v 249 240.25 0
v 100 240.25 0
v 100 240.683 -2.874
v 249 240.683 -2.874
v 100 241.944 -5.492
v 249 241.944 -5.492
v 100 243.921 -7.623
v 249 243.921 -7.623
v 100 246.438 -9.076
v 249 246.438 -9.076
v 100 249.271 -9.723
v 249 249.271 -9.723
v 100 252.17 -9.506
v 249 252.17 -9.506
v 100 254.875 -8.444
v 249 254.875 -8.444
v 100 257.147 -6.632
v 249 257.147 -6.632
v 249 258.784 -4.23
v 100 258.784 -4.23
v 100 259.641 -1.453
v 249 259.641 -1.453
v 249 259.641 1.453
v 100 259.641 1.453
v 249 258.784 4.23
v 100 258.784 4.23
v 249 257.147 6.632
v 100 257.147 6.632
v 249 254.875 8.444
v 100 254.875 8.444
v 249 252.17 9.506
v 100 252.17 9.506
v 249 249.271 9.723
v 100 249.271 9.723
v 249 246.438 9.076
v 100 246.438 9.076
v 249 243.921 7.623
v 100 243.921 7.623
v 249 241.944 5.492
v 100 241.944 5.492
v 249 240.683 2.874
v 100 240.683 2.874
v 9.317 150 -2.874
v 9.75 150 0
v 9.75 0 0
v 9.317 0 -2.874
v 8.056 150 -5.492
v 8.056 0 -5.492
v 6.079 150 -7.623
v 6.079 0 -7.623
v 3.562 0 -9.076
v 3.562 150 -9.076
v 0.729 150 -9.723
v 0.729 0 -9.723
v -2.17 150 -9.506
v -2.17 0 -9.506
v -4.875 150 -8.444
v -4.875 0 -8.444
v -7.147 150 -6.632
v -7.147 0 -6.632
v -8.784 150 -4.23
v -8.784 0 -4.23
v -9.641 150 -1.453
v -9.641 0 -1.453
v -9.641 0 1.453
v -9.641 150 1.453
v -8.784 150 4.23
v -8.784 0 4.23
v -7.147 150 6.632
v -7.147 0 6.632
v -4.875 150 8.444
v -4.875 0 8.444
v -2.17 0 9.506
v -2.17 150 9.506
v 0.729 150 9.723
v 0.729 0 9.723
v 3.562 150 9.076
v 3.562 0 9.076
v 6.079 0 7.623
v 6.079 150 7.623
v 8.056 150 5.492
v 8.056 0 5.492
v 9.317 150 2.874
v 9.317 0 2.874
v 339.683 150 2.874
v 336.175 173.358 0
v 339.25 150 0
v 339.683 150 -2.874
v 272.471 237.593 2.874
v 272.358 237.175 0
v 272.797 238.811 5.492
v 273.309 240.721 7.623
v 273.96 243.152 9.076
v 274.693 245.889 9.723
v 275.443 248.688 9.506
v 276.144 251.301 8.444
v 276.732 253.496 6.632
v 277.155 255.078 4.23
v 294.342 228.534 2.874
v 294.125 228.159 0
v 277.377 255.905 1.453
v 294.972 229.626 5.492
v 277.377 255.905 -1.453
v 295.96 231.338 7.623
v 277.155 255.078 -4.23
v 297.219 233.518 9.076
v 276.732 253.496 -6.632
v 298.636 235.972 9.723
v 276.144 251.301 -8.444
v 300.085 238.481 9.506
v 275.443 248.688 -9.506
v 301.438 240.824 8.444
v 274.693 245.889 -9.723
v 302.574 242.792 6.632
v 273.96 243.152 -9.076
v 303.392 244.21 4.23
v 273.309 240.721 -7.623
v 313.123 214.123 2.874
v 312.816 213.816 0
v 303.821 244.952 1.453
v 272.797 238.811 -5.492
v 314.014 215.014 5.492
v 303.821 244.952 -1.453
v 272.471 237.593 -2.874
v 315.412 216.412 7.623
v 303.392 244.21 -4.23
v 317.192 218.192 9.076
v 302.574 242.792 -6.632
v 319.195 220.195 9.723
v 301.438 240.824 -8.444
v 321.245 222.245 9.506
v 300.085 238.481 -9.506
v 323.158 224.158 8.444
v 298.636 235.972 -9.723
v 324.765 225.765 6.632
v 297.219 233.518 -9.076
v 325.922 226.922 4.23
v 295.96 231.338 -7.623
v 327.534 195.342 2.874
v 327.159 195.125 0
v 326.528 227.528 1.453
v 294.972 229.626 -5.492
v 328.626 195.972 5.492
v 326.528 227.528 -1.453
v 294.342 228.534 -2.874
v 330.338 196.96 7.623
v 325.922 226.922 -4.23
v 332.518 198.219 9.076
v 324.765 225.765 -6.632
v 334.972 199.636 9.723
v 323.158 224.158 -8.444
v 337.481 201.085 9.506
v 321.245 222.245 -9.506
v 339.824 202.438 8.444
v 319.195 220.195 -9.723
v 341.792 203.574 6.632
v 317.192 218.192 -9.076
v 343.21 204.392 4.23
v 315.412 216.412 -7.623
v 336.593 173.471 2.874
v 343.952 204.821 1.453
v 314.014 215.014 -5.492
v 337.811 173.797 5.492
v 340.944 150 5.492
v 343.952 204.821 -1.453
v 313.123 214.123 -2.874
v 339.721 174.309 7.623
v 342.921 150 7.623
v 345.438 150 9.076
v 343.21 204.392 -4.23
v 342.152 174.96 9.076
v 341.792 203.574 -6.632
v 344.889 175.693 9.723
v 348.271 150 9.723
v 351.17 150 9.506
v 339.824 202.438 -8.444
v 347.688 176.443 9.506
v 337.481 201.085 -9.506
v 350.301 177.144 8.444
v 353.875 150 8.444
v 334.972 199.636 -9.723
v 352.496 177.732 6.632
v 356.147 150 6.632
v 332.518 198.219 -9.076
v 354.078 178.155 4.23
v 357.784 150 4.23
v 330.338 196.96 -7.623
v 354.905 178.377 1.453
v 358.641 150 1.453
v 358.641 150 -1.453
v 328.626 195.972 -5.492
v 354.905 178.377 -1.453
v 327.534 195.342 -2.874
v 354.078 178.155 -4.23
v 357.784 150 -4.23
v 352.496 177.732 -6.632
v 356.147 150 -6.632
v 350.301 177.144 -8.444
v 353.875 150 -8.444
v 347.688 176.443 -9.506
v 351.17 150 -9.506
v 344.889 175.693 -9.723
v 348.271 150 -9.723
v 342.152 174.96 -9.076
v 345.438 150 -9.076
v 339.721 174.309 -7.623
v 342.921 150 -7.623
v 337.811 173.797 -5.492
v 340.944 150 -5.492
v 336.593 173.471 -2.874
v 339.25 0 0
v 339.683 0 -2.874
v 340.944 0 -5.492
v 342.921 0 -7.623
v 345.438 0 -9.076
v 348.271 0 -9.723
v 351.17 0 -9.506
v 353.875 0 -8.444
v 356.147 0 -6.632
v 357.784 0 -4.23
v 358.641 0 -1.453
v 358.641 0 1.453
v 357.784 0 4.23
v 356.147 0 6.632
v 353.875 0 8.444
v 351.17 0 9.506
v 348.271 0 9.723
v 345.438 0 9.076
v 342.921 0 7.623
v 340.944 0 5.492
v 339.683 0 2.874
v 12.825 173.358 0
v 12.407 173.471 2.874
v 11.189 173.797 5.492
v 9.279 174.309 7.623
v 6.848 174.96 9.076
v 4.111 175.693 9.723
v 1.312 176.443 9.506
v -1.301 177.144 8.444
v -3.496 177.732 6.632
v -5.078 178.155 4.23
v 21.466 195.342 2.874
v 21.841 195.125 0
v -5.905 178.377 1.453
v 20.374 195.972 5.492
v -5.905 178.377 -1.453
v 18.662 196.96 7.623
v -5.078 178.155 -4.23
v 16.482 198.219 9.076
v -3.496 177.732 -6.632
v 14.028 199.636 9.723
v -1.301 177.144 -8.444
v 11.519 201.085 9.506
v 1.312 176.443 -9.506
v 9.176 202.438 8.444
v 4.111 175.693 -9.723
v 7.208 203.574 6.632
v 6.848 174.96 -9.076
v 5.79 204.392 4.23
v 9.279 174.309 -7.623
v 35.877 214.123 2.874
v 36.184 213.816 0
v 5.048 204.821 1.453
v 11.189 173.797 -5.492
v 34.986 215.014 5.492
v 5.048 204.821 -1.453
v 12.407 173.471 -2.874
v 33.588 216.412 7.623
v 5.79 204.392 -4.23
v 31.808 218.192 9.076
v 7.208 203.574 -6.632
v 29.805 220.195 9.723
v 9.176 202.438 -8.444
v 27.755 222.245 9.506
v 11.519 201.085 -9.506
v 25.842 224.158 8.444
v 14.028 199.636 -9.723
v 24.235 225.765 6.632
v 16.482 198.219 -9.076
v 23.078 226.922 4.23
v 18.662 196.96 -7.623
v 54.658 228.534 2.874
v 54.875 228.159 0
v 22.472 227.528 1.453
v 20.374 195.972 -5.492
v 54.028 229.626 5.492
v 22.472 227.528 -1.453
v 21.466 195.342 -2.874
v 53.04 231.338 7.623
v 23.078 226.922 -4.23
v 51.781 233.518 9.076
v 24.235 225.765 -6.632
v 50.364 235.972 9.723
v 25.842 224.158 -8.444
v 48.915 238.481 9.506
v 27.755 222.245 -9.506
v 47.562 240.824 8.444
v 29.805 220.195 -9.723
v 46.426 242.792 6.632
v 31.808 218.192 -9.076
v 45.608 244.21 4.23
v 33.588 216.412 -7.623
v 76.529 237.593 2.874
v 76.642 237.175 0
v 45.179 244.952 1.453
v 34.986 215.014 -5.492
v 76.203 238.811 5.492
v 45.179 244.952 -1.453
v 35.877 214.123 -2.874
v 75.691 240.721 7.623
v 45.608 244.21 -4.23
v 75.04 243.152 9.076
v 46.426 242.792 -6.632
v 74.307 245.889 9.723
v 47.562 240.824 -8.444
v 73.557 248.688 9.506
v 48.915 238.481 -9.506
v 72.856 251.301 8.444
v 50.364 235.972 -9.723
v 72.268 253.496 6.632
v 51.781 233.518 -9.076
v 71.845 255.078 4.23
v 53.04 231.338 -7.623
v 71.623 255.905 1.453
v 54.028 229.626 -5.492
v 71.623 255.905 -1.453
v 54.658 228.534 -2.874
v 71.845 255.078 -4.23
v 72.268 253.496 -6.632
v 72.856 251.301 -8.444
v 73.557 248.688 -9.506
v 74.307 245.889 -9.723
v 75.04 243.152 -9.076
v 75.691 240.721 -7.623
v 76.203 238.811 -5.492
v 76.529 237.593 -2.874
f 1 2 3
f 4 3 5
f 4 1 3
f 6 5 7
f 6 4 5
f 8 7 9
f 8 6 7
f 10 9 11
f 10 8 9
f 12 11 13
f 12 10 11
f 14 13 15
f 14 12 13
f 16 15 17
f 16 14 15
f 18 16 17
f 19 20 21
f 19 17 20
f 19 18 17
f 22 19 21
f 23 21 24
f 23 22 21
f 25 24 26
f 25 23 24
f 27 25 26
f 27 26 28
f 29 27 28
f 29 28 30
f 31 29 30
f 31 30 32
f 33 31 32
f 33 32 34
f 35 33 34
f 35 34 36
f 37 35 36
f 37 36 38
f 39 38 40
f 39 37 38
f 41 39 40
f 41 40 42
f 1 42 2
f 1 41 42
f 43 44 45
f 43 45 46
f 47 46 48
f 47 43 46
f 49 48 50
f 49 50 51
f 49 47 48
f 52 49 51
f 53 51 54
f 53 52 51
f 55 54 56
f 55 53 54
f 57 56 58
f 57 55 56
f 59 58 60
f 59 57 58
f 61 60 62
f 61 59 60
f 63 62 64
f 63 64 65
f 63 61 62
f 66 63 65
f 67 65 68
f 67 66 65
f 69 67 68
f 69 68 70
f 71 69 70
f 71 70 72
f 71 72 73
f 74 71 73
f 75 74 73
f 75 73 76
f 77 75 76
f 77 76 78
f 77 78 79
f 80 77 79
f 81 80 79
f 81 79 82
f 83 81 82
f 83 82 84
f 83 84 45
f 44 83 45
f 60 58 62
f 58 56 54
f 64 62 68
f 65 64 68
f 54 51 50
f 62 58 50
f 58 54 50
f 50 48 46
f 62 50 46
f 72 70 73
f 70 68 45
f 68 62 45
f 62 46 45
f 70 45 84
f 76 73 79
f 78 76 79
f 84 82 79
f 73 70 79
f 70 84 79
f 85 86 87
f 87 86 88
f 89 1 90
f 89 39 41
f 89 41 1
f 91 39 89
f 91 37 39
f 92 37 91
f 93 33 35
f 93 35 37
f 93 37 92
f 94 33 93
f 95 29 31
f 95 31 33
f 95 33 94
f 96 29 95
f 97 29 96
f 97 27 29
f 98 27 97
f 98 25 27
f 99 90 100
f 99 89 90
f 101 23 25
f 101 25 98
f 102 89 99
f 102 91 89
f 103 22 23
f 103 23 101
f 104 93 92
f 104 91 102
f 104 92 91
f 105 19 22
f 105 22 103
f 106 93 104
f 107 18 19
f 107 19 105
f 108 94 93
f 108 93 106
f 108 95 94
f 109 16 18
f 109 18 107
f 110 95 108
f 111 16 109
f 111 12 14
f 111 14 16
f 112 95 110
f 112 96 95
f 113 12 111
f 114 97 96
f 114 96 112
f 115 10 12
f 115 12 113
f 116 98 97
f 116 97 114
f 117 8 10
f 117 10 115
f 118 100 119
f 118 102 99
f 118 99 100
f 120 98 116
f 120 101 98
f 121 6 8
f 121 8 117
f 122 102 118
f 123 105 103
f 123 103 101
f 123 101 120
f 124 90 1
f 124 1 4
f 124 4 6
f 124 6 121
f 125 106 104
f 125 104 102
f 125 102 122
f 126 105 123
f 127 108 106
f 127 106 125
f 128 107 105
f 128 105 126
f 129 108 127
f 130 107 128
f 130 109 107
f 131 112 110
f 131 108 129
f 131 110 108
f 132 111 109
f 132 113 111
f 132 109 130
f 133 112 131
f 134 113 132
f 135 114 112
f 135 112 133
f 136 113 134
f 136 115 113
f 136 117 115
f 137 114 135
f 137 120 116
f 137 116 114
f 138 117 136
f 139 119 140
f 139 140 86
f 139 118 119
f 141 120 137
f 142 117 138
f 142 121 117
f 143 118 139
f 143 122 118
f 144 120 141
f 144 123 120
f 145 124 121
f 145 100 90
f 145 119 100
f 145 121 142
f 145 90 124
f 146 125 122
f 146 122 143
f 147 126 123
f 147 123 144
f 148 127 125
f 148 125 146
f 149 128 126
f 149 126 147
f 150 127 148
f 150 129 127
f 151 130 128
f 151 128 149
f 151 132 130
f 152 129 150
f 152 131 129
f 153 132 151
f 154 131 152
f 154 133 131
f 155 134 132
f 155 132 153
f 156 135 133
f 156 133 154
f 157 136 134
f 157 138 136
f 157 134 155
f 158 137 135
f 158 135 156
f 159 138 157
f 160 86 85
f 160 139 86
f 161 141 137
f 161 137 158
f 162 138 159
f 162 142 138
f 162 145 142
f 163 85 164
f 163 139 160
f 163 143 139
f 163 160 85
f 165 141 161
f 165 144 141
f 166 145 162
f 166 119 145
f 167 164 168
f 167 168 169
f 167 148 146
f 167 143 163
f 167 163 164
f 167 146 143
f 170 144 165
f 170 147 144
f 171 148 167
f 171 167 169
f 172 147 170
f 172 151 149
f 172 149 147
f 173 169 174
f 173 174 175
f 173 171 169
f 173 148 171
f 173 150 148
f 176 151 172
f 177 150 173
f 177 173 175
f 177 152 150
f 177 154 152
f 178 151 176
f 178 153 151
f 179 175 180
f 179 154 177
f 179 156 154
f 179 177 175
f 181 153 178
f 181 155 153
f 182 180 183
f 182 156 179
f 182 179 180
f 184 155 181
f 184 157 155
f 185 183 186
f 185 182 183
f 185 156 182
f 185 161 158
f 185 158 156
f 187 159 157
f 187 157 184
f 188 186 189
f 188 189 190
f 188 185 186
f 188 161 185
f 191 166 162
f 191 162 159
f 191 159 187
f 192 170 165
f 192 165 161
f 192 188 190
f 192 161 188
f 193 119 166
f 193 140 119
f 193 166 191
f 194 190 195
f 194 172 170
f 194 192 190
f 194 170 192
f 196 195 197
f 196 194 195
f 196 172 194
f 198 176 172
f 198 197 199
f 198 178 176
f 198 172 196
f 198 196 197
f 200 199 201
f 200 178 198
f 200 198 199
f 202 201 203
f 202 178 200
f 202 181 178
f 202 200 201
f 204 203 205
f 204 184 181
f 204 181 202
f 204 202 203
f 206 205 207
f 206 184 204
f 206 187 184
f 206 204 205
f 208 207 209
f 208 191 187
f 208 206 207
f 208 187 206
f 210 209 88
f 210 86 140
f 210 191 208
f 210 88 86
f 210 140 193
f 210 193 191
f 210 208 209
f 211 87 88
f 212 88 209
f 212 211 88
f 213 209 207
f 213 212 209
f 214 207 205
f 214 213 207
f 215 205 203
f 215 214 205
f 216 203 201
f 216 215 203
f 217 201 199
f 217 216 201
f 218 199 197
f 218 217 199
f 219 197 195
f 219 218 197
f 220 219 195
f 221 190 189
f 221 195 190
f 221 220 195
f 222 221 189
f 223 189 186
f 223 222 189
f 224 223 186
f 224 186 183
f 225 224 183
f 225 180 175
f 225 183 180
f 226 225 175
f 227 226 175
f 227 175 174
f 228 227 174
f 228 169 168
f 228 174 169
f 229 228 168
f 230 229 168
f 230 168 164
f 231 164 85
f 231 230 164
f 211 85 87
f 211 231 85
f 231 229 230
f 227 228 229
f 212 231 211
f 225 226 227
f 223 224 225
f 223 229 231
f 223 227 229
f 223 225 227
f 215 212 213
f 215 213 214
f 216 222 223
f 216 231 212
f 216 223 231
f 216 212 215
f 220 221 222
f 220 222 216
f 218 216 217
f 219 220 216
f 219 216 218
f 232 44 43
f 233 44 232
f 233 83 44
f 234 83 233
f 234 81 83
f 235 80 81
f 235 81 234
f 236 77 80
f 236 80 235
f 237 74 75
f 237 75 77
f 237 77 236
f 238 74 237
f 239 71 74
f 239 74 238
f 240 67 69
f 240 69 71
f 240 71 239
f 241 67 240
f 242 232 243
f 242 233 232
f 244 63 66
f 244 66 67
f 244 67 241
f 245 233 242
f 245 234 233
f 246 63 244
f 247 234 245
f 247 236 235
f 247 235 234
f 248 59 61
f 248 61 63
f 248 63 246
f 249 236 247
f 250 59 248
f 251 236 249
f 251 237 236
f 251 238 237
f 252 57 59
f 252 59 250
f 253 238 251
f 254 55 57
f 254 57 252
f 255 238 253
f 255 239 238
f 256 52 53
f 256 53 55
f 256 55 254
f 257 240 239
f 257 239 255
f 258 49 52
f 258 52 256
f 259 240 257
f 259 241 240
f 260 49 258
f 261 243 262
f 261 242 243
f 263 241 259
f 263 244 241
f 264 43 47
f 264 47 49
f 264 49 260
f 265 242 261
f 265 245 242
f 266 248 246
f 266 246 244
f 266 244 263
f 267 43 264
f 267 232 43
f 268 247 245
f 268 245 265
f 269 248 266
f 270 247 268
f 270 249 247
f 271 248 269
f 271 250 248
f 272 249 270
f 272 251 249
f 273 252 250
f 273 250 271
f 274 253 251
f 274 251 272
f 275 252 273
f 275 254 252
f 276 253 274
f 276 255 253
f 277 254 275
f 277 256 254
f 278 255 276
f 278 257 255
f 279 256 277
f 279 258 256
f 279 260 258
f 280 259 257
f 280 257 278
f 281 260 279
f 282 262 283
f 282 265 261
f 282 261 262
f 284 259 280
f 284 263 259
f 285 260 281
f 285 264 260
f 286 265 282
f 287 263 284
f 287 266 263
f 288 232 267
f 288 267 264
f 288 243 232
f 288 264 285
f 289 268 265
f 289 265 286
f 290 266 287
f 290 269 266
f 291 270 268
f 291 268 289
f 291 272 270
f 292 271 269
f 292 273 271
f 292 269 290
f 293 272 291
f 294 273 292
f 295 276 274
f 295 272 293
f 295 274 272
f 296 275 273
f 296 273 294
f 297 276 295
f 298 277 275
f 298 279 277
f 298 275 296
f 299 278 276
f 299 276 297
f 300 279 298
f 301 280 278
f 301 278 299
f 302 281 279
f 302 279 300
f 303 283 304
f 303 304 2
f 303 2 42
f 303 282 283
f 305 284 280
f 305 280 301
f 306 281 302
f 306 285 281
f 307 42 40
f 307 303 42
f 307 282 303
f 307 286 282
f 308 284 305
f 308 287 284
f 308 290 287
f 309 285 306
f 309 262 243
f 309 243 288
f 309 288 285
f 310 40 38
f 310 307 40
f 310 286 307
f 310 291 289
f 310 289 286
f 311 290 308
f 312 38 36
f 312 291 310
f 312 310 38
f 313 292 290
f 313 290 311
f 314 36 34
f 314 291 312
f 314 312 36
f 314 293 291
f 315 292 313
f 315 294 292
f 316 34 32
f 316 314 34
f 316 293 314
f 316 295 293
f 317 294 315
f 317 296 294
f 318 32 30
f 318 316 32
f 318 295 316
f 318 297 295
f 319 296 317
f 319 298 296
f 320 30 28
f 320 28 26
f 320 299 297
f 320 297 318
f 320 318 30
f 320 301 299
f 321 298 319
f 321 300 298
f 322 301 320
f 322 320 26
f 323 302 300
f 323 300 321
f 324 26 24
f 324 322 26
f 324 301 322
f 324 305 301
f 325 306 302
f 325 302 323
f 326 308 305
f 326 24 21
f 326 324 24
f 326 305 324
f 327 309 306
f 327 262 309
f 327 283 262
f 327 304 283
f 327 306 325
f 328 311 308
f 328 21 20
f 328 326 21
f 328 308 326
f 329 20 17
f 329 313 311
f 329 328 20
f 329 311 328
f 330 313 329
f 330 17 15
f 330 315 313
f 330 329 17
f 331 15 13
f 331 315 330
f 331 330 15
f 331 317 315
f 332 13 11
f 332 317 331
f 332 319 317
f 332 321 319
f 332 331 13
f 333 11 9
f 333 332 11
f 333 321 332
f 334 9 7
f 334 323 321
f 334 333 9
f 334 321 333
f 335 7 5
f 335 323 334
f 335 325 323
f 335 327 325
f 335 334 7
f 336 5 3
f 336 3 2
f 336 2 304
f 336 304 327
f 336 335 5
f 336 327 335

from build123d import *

# Parameters (mm, degrees)
CROQUIS2_R = 9.75


with BuildPart() as part:
    # Barrer1: sweep along a path in Croquis1
    with BuildLine(Plane.XY) as barrer1_path:
        Line((0, 0), (0, 150))
        ThreePointArc((0, 150), (29.289321881, 220.710678119), (100, 250))
        Line((100, 250), (249, 250))
        ThreePointArc((249, 250), (319.710678119, 220.710678119), (349, 150))
        Line((349, 150), (349, 0))
    # Croquis2 → Barrer1 (sweep)
    with BuildSketch(Plane(origin=(0, 0, 0), x_dir=(1, 0, 0), z_dir=(0, 1, 0))):
        Circle(CROQUIS2_R)
    sweep(path=barrer1_path.line)


solid = part.part
